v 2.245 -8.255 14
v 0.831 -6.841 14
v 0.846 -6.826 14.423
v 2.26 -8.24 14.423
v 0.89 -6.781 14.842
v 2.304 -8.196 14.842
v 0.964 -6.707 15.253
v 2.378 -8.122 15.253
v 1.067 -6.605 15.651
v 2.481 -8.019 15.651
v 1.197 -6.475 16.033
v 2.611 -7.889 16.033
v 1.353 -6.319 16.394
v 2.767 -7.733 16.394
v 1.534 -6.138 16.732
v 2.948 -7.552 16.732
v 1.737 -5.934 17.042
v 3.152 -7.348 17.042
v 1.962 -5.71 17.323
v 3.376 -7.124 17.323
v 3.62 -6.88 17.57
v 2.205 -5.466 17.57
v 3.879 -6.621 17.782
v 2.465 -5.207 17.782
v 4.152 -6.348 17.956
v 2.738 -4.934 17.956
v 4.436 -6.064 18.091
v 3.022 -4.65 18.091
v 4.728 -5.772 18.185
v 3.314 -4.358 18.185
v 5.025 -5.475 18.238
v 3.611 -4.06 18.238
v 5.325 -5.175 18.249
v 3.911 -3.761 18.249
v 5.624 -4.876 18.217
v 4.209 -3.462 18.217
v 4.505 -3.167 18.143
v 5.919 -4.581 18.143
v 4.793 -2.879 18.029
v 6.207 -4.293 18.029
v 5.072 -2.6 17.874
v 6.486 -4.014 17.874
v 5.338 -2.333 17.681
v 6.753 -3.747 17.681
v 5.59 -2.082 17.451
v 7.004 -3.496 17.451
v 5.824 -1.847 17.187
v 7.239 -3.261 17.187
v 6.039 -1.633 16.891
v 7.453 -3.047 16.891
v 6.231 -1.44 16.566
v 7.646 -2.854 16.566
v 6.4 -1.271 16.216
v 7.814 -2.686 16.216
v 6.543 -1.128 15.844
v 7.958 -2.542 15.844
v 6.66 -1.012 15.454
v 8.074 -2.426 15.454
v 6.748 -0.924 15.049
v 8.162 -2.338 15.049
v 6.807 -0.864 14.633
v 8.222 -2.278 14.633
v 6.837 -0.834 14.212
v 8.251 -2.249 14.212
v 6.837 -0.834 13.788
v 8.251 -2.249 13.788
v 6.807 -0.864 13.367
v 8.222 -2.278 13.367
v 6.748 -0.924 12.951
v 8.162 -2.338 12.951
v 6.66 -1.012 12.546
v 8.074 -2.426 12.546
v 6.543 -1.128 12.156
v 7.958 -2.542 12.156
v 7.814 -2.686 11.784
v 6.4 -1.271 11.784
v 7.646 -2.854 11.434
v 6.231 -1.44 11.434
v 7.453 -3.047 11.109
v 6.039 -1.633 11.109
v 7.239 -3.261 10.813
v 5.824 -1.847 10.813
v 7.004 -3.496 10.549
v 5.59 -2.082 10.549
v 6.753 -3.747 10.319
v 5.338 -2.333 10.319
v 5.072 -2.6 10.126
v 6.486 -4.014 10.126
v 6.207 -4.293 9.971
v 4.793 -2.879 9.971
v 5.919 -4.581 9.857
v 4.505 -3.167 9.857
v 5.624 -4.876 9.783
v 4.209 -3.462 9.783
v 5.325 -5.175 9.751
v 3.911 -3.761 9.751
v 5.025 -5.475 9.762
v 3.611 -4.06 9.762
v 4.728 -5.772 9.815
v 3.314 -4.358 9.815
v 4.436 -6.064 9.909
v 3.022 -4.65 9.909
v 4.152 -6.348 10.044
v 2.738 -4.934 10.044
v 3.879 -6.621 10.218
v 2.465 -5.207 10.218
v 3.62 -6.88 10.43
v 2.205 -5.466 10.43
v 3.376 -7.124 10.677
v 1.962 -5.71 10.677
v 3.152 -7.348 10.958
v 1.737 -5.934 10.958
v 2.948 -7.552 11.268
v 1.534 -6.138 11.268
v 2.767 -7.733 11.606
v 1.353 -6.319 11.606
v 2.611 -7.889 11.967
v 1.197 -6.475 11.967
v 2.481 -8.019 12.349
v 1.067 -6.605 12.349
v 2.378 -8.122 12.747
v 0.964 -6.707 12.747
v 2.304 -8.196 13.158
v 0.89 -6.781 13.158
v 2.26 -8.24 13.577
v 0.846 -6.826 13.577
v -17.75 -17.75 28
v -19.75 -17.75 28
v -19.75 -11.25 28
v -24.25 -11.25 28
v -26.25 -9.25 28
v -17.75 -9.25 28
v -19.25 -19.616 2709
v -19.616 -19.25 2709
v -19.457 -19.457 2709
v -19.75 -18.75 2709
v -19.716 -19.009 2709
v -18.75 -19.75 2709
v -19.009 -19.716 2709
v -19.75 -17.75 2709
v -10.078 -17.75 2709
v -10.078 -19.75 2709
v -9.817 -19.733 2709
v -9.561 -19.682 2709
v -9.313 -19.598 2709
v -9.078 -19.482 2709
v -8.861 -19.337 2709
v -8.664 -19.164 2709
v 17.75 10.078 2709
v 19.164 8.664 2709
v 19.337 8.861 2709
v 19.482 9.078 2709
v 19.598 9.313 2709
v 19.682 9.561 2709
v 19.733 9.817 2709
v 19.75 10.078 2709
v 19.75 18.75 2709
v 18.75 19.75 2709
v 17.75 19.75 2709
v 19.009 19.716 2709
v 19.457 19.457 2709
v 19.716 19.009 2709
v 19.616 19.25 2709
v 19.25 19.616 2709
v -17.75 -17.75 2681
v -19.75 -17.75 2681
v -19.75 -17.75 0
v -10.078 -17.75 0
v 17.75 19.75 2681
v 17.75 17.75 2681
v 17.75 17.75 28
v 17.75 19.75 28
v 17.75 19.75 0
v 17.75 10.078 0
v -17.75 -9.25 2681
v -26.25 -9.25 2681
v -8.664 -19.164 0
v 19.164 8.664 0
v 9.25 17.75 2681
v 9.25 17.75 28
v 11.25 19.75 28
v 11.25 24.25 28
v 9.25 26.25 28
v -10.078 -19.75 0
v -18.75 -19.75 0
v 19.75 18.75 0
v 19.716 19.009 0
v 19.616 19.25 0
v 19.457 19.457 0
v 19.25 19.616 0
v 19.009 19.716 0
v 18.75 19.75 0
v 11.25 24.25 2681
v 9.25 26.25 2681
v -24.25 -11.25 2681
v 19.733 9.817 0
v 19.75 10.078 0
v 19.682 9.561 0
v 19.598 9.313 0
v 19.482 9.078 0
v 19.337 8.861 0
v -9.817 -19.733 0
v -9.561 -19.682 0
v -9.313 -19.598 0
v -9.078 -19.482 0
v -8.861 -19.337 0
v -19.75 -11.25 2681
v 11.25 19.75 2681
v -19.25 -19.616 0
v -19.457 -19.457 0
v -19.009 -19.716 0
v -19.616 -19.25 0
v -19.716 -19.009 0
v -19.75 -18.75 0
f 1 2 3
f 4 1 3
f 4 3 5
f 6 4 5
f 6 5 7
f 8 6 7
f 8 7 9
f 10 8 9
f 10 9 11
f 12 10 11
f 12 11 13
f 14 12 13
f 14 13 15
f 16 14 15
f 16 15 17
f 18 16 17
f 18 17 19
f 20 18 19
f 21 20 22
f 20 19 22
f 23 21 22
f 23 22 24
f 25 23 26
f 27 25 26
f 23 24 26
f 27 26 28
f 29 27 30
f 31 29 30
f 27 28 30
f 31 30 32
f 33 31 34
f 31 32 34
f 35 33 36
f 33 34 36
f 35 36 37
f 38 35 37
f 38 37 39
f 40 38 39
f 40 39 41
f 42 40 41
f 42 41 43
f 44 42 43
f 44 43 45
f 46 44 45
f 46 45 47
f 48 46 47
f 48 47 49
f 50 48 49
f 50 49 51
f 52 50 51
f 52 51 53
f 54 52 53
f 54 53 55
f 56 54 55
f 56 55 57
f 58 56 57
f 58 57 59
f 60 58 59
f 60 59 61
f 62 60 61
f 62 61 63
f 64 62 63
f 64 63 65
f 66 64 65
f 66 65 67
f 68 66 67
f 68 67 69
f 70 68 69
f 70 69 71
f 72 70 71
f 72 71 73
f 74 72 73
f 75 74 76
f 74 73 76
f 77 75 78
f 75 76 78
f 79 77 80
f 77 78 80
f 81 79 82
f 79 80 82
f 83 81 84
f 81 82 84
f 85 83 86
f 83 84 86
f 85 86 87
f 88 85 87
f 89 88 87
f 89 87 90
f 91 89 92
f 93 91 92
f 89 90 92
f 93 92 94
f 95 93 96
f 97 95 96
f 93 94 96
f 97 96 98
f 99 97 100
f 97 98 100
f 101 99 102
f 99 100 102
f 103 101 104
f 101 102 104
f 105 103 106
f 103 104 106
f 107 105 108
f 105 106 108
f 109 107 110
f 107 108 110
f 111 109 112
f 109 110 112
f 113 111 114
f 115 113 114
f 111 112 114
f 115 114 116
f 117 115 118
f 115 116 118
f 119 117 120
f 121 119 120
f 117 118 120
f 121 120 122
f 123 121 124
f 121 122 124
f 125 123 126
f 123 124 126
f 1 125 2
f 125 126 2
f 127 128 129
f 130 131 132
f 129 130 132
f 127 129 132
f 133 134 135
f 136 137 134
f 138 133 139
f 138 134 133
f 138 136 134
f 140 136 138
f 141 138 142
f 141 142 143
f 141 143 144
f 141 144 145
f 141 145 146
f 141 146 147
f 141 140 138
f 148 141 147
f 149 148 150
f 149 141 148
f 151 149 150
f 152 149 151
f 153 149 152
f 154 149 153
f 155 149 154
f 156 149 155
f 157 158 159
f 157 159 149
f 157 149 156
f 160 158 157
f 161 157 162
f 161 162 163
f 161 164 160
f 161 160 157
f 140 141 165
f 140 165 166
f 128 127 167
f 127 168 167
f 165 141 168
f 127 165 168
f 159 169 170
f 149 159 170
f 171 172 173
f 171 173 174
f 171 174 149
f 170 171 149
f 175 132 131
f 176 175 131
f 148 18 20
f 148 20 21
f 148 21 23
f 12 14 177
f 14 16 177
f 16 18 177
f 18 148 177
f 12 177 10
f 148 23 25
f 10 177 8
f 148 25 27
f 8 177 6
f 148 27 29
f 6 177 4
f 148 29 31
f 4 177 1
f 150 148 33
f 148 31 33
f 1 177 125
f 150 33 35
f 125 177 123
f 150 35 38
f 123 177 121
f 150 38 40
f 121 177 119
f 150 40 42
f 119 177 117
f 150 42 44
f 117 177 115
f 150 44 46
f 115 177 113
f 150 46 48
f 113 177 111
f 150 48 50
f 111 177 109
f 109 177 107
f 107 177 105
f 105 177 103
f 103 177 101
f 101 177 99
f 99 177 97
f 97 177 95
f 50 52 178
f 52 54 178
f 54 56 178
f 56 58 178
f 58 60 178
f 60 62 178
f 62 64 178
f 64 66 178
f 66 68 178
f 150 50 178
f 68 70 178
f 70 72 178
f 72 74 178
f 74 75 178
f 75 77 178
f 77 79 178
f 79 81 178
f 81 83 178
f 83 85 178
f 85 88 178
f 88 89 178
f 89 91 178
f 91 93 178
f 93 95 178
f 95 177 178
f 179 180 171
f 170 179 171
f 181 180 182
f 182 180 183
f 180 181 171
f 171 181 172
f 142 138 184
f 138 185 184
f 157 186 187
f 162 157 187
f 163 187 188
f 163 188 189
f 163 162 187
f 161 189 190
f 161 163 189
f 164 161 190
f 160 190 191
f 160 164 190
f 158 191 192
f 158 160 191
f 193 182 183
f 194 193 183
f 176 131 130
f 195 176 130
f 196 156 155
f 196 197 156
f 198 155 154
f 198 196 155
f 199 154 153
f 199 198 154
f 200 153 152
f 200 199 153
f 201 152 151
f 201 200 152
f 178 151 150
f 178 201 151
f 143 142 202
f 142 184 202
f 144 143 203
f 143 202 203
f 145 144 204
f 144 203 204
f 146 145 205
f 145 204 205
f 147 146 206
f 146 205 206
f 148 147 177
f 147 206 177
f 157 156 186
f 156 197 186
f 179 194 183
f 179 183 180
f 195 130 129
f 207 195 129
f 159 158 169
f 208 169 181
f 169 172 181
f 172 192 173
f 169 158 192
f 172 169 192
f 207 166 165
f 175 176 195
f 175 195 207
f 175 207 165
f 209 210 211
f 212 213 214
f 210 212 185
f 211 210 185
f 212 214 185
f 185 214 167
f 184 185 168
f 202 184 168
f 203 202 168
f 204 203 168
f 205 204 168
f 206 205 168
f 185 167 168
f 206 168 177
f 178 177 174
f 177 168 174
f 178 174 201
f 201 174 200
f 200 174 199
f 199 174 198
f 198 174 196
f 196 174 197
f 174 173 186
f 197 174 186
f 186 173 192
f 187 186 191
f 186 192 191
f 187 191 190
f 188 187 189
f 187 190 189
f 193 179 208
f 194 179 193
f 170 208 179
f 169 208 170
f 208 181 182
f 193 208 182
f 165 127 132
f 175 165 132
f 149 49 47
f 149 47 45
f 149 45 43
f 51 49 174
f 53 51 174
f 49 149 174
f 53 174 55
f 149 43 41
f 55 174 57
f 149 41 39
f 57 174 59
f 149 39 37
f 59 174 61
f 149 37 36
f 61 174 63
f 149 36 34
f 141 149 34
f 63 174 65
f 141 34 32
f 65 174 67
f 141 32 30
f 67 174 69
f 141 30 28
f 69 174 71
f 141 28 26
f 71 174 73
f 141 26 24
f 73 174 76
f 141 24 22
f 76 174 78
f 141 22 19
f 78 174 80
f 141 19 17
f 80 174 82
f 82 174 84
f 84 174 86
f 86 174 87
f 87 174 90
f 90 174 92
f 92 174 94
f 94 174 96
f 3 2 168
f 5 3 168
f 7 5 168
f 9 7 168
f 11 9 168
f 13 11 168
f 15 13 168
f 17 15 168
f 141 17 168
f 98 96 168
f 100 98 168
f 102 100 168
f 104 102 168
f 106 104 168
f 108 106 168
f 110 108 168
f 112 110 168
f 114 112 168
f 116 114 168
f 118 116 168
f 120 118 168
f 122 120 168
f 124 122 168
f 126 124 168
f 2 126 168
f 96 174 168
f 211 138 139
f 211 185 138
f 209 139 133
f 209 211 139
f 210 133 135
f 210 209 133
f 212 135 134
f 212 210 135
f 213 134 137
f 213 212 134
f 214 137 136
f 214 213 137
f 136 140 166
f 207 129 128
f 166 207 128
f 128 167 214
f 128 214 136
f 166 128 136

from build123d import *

# Parameters (mm, degrees)
F1_DEPTH = 28
F3_DEPTH = 2653
F5_DEPTH = 28
F6_R     = 2
F7_R     = 1
F8_R     = 4.25
F9_DEPTH = 25


with BuildPart() as f1:
    # F0 (on Top) → F1 (new body)
    with BuildSketch(Plane.XY):
        Polygon((-19.75, -17.750001), (-19.75, -19.75), (-9.25, -19.75), (19.75, 9.25), (19.75, 19.75), (17.750001, 19.75), (17.750001, 10.078427), (-10.078427, -17.750001), align=None)
    extrude(amount=F1_DEPTH)

    # F2 (on face) → F3 (join)
    with BuildSketch(Plane.XY.offset(28)):
        Polygon((-19.75, -19.75), (-9.25, -19.75), (19.75, 9.25), (19.75, 19.75), (11.25, 19.75), (11.25, 24.25), (9.25, 26.25), (9.25, 23.421573), (9.25, 19.75), (9.25, 17.750001), (17.750001, 17.750001), (17.750001, 10.078427), (16.585787, 8.914213), (-8.914213, -16.585787), (-10.078427, -17.750001), (-17.750001, -17.750001), (-17.750001, -9.25), (-19.75, -9.25), (-23.421573, -9.25), (-26.25, -9.25), (-24.25, -11.25), (-19.75, -11.25), align=None)
    extrude(amount=F3_DEPTH)

    # F4 (on face) → F5 (join)
    with BuildSketch(Plane.XY.offset(2681)):
        Polygon((19.75, 9.25), (19.75, 19.75), (17.750001, 19.75), (17.750001, 10.078427), (-10.078427, -17.750001), (-19.75, -17.750001), (-19.75, -19.75), (-9.25, -19.75), align=None)
    extrude(amount=F5_DEPTH)

    # F6
    f6_edges = [f1.edges().sort_by_distance(p)[0] for p in [
        (19.75, 9.25, 1354.5),
        (-9.25, -19.75, 1354.5),
    ]]
    fillet(f6_edges, radius=F6_R)

    # F7
    f7_edges = [f1.edges().sort_by_distance(p)[0] for p in [
        (-19.75, -19.75, 1354.5),
        (19.75, 19.75, 1354.5),
    ]]
    fillet(f7_edges, radius=F7_R)

    # F8 (on face) → F9 (cut)
    with BuildSketch(Plane(origin=(3.835787, -3.835787, 0), x_dir=(-0.707107, -0.707107, 0), z_dir=(-0.707107, 0.707107, 0))):
        with Locations((0, 14)):
            Circle(F8_R)
    extrude(amount=-F9_DEPTH, mode=Mode.SUBTRACT)


solid = f1.part
